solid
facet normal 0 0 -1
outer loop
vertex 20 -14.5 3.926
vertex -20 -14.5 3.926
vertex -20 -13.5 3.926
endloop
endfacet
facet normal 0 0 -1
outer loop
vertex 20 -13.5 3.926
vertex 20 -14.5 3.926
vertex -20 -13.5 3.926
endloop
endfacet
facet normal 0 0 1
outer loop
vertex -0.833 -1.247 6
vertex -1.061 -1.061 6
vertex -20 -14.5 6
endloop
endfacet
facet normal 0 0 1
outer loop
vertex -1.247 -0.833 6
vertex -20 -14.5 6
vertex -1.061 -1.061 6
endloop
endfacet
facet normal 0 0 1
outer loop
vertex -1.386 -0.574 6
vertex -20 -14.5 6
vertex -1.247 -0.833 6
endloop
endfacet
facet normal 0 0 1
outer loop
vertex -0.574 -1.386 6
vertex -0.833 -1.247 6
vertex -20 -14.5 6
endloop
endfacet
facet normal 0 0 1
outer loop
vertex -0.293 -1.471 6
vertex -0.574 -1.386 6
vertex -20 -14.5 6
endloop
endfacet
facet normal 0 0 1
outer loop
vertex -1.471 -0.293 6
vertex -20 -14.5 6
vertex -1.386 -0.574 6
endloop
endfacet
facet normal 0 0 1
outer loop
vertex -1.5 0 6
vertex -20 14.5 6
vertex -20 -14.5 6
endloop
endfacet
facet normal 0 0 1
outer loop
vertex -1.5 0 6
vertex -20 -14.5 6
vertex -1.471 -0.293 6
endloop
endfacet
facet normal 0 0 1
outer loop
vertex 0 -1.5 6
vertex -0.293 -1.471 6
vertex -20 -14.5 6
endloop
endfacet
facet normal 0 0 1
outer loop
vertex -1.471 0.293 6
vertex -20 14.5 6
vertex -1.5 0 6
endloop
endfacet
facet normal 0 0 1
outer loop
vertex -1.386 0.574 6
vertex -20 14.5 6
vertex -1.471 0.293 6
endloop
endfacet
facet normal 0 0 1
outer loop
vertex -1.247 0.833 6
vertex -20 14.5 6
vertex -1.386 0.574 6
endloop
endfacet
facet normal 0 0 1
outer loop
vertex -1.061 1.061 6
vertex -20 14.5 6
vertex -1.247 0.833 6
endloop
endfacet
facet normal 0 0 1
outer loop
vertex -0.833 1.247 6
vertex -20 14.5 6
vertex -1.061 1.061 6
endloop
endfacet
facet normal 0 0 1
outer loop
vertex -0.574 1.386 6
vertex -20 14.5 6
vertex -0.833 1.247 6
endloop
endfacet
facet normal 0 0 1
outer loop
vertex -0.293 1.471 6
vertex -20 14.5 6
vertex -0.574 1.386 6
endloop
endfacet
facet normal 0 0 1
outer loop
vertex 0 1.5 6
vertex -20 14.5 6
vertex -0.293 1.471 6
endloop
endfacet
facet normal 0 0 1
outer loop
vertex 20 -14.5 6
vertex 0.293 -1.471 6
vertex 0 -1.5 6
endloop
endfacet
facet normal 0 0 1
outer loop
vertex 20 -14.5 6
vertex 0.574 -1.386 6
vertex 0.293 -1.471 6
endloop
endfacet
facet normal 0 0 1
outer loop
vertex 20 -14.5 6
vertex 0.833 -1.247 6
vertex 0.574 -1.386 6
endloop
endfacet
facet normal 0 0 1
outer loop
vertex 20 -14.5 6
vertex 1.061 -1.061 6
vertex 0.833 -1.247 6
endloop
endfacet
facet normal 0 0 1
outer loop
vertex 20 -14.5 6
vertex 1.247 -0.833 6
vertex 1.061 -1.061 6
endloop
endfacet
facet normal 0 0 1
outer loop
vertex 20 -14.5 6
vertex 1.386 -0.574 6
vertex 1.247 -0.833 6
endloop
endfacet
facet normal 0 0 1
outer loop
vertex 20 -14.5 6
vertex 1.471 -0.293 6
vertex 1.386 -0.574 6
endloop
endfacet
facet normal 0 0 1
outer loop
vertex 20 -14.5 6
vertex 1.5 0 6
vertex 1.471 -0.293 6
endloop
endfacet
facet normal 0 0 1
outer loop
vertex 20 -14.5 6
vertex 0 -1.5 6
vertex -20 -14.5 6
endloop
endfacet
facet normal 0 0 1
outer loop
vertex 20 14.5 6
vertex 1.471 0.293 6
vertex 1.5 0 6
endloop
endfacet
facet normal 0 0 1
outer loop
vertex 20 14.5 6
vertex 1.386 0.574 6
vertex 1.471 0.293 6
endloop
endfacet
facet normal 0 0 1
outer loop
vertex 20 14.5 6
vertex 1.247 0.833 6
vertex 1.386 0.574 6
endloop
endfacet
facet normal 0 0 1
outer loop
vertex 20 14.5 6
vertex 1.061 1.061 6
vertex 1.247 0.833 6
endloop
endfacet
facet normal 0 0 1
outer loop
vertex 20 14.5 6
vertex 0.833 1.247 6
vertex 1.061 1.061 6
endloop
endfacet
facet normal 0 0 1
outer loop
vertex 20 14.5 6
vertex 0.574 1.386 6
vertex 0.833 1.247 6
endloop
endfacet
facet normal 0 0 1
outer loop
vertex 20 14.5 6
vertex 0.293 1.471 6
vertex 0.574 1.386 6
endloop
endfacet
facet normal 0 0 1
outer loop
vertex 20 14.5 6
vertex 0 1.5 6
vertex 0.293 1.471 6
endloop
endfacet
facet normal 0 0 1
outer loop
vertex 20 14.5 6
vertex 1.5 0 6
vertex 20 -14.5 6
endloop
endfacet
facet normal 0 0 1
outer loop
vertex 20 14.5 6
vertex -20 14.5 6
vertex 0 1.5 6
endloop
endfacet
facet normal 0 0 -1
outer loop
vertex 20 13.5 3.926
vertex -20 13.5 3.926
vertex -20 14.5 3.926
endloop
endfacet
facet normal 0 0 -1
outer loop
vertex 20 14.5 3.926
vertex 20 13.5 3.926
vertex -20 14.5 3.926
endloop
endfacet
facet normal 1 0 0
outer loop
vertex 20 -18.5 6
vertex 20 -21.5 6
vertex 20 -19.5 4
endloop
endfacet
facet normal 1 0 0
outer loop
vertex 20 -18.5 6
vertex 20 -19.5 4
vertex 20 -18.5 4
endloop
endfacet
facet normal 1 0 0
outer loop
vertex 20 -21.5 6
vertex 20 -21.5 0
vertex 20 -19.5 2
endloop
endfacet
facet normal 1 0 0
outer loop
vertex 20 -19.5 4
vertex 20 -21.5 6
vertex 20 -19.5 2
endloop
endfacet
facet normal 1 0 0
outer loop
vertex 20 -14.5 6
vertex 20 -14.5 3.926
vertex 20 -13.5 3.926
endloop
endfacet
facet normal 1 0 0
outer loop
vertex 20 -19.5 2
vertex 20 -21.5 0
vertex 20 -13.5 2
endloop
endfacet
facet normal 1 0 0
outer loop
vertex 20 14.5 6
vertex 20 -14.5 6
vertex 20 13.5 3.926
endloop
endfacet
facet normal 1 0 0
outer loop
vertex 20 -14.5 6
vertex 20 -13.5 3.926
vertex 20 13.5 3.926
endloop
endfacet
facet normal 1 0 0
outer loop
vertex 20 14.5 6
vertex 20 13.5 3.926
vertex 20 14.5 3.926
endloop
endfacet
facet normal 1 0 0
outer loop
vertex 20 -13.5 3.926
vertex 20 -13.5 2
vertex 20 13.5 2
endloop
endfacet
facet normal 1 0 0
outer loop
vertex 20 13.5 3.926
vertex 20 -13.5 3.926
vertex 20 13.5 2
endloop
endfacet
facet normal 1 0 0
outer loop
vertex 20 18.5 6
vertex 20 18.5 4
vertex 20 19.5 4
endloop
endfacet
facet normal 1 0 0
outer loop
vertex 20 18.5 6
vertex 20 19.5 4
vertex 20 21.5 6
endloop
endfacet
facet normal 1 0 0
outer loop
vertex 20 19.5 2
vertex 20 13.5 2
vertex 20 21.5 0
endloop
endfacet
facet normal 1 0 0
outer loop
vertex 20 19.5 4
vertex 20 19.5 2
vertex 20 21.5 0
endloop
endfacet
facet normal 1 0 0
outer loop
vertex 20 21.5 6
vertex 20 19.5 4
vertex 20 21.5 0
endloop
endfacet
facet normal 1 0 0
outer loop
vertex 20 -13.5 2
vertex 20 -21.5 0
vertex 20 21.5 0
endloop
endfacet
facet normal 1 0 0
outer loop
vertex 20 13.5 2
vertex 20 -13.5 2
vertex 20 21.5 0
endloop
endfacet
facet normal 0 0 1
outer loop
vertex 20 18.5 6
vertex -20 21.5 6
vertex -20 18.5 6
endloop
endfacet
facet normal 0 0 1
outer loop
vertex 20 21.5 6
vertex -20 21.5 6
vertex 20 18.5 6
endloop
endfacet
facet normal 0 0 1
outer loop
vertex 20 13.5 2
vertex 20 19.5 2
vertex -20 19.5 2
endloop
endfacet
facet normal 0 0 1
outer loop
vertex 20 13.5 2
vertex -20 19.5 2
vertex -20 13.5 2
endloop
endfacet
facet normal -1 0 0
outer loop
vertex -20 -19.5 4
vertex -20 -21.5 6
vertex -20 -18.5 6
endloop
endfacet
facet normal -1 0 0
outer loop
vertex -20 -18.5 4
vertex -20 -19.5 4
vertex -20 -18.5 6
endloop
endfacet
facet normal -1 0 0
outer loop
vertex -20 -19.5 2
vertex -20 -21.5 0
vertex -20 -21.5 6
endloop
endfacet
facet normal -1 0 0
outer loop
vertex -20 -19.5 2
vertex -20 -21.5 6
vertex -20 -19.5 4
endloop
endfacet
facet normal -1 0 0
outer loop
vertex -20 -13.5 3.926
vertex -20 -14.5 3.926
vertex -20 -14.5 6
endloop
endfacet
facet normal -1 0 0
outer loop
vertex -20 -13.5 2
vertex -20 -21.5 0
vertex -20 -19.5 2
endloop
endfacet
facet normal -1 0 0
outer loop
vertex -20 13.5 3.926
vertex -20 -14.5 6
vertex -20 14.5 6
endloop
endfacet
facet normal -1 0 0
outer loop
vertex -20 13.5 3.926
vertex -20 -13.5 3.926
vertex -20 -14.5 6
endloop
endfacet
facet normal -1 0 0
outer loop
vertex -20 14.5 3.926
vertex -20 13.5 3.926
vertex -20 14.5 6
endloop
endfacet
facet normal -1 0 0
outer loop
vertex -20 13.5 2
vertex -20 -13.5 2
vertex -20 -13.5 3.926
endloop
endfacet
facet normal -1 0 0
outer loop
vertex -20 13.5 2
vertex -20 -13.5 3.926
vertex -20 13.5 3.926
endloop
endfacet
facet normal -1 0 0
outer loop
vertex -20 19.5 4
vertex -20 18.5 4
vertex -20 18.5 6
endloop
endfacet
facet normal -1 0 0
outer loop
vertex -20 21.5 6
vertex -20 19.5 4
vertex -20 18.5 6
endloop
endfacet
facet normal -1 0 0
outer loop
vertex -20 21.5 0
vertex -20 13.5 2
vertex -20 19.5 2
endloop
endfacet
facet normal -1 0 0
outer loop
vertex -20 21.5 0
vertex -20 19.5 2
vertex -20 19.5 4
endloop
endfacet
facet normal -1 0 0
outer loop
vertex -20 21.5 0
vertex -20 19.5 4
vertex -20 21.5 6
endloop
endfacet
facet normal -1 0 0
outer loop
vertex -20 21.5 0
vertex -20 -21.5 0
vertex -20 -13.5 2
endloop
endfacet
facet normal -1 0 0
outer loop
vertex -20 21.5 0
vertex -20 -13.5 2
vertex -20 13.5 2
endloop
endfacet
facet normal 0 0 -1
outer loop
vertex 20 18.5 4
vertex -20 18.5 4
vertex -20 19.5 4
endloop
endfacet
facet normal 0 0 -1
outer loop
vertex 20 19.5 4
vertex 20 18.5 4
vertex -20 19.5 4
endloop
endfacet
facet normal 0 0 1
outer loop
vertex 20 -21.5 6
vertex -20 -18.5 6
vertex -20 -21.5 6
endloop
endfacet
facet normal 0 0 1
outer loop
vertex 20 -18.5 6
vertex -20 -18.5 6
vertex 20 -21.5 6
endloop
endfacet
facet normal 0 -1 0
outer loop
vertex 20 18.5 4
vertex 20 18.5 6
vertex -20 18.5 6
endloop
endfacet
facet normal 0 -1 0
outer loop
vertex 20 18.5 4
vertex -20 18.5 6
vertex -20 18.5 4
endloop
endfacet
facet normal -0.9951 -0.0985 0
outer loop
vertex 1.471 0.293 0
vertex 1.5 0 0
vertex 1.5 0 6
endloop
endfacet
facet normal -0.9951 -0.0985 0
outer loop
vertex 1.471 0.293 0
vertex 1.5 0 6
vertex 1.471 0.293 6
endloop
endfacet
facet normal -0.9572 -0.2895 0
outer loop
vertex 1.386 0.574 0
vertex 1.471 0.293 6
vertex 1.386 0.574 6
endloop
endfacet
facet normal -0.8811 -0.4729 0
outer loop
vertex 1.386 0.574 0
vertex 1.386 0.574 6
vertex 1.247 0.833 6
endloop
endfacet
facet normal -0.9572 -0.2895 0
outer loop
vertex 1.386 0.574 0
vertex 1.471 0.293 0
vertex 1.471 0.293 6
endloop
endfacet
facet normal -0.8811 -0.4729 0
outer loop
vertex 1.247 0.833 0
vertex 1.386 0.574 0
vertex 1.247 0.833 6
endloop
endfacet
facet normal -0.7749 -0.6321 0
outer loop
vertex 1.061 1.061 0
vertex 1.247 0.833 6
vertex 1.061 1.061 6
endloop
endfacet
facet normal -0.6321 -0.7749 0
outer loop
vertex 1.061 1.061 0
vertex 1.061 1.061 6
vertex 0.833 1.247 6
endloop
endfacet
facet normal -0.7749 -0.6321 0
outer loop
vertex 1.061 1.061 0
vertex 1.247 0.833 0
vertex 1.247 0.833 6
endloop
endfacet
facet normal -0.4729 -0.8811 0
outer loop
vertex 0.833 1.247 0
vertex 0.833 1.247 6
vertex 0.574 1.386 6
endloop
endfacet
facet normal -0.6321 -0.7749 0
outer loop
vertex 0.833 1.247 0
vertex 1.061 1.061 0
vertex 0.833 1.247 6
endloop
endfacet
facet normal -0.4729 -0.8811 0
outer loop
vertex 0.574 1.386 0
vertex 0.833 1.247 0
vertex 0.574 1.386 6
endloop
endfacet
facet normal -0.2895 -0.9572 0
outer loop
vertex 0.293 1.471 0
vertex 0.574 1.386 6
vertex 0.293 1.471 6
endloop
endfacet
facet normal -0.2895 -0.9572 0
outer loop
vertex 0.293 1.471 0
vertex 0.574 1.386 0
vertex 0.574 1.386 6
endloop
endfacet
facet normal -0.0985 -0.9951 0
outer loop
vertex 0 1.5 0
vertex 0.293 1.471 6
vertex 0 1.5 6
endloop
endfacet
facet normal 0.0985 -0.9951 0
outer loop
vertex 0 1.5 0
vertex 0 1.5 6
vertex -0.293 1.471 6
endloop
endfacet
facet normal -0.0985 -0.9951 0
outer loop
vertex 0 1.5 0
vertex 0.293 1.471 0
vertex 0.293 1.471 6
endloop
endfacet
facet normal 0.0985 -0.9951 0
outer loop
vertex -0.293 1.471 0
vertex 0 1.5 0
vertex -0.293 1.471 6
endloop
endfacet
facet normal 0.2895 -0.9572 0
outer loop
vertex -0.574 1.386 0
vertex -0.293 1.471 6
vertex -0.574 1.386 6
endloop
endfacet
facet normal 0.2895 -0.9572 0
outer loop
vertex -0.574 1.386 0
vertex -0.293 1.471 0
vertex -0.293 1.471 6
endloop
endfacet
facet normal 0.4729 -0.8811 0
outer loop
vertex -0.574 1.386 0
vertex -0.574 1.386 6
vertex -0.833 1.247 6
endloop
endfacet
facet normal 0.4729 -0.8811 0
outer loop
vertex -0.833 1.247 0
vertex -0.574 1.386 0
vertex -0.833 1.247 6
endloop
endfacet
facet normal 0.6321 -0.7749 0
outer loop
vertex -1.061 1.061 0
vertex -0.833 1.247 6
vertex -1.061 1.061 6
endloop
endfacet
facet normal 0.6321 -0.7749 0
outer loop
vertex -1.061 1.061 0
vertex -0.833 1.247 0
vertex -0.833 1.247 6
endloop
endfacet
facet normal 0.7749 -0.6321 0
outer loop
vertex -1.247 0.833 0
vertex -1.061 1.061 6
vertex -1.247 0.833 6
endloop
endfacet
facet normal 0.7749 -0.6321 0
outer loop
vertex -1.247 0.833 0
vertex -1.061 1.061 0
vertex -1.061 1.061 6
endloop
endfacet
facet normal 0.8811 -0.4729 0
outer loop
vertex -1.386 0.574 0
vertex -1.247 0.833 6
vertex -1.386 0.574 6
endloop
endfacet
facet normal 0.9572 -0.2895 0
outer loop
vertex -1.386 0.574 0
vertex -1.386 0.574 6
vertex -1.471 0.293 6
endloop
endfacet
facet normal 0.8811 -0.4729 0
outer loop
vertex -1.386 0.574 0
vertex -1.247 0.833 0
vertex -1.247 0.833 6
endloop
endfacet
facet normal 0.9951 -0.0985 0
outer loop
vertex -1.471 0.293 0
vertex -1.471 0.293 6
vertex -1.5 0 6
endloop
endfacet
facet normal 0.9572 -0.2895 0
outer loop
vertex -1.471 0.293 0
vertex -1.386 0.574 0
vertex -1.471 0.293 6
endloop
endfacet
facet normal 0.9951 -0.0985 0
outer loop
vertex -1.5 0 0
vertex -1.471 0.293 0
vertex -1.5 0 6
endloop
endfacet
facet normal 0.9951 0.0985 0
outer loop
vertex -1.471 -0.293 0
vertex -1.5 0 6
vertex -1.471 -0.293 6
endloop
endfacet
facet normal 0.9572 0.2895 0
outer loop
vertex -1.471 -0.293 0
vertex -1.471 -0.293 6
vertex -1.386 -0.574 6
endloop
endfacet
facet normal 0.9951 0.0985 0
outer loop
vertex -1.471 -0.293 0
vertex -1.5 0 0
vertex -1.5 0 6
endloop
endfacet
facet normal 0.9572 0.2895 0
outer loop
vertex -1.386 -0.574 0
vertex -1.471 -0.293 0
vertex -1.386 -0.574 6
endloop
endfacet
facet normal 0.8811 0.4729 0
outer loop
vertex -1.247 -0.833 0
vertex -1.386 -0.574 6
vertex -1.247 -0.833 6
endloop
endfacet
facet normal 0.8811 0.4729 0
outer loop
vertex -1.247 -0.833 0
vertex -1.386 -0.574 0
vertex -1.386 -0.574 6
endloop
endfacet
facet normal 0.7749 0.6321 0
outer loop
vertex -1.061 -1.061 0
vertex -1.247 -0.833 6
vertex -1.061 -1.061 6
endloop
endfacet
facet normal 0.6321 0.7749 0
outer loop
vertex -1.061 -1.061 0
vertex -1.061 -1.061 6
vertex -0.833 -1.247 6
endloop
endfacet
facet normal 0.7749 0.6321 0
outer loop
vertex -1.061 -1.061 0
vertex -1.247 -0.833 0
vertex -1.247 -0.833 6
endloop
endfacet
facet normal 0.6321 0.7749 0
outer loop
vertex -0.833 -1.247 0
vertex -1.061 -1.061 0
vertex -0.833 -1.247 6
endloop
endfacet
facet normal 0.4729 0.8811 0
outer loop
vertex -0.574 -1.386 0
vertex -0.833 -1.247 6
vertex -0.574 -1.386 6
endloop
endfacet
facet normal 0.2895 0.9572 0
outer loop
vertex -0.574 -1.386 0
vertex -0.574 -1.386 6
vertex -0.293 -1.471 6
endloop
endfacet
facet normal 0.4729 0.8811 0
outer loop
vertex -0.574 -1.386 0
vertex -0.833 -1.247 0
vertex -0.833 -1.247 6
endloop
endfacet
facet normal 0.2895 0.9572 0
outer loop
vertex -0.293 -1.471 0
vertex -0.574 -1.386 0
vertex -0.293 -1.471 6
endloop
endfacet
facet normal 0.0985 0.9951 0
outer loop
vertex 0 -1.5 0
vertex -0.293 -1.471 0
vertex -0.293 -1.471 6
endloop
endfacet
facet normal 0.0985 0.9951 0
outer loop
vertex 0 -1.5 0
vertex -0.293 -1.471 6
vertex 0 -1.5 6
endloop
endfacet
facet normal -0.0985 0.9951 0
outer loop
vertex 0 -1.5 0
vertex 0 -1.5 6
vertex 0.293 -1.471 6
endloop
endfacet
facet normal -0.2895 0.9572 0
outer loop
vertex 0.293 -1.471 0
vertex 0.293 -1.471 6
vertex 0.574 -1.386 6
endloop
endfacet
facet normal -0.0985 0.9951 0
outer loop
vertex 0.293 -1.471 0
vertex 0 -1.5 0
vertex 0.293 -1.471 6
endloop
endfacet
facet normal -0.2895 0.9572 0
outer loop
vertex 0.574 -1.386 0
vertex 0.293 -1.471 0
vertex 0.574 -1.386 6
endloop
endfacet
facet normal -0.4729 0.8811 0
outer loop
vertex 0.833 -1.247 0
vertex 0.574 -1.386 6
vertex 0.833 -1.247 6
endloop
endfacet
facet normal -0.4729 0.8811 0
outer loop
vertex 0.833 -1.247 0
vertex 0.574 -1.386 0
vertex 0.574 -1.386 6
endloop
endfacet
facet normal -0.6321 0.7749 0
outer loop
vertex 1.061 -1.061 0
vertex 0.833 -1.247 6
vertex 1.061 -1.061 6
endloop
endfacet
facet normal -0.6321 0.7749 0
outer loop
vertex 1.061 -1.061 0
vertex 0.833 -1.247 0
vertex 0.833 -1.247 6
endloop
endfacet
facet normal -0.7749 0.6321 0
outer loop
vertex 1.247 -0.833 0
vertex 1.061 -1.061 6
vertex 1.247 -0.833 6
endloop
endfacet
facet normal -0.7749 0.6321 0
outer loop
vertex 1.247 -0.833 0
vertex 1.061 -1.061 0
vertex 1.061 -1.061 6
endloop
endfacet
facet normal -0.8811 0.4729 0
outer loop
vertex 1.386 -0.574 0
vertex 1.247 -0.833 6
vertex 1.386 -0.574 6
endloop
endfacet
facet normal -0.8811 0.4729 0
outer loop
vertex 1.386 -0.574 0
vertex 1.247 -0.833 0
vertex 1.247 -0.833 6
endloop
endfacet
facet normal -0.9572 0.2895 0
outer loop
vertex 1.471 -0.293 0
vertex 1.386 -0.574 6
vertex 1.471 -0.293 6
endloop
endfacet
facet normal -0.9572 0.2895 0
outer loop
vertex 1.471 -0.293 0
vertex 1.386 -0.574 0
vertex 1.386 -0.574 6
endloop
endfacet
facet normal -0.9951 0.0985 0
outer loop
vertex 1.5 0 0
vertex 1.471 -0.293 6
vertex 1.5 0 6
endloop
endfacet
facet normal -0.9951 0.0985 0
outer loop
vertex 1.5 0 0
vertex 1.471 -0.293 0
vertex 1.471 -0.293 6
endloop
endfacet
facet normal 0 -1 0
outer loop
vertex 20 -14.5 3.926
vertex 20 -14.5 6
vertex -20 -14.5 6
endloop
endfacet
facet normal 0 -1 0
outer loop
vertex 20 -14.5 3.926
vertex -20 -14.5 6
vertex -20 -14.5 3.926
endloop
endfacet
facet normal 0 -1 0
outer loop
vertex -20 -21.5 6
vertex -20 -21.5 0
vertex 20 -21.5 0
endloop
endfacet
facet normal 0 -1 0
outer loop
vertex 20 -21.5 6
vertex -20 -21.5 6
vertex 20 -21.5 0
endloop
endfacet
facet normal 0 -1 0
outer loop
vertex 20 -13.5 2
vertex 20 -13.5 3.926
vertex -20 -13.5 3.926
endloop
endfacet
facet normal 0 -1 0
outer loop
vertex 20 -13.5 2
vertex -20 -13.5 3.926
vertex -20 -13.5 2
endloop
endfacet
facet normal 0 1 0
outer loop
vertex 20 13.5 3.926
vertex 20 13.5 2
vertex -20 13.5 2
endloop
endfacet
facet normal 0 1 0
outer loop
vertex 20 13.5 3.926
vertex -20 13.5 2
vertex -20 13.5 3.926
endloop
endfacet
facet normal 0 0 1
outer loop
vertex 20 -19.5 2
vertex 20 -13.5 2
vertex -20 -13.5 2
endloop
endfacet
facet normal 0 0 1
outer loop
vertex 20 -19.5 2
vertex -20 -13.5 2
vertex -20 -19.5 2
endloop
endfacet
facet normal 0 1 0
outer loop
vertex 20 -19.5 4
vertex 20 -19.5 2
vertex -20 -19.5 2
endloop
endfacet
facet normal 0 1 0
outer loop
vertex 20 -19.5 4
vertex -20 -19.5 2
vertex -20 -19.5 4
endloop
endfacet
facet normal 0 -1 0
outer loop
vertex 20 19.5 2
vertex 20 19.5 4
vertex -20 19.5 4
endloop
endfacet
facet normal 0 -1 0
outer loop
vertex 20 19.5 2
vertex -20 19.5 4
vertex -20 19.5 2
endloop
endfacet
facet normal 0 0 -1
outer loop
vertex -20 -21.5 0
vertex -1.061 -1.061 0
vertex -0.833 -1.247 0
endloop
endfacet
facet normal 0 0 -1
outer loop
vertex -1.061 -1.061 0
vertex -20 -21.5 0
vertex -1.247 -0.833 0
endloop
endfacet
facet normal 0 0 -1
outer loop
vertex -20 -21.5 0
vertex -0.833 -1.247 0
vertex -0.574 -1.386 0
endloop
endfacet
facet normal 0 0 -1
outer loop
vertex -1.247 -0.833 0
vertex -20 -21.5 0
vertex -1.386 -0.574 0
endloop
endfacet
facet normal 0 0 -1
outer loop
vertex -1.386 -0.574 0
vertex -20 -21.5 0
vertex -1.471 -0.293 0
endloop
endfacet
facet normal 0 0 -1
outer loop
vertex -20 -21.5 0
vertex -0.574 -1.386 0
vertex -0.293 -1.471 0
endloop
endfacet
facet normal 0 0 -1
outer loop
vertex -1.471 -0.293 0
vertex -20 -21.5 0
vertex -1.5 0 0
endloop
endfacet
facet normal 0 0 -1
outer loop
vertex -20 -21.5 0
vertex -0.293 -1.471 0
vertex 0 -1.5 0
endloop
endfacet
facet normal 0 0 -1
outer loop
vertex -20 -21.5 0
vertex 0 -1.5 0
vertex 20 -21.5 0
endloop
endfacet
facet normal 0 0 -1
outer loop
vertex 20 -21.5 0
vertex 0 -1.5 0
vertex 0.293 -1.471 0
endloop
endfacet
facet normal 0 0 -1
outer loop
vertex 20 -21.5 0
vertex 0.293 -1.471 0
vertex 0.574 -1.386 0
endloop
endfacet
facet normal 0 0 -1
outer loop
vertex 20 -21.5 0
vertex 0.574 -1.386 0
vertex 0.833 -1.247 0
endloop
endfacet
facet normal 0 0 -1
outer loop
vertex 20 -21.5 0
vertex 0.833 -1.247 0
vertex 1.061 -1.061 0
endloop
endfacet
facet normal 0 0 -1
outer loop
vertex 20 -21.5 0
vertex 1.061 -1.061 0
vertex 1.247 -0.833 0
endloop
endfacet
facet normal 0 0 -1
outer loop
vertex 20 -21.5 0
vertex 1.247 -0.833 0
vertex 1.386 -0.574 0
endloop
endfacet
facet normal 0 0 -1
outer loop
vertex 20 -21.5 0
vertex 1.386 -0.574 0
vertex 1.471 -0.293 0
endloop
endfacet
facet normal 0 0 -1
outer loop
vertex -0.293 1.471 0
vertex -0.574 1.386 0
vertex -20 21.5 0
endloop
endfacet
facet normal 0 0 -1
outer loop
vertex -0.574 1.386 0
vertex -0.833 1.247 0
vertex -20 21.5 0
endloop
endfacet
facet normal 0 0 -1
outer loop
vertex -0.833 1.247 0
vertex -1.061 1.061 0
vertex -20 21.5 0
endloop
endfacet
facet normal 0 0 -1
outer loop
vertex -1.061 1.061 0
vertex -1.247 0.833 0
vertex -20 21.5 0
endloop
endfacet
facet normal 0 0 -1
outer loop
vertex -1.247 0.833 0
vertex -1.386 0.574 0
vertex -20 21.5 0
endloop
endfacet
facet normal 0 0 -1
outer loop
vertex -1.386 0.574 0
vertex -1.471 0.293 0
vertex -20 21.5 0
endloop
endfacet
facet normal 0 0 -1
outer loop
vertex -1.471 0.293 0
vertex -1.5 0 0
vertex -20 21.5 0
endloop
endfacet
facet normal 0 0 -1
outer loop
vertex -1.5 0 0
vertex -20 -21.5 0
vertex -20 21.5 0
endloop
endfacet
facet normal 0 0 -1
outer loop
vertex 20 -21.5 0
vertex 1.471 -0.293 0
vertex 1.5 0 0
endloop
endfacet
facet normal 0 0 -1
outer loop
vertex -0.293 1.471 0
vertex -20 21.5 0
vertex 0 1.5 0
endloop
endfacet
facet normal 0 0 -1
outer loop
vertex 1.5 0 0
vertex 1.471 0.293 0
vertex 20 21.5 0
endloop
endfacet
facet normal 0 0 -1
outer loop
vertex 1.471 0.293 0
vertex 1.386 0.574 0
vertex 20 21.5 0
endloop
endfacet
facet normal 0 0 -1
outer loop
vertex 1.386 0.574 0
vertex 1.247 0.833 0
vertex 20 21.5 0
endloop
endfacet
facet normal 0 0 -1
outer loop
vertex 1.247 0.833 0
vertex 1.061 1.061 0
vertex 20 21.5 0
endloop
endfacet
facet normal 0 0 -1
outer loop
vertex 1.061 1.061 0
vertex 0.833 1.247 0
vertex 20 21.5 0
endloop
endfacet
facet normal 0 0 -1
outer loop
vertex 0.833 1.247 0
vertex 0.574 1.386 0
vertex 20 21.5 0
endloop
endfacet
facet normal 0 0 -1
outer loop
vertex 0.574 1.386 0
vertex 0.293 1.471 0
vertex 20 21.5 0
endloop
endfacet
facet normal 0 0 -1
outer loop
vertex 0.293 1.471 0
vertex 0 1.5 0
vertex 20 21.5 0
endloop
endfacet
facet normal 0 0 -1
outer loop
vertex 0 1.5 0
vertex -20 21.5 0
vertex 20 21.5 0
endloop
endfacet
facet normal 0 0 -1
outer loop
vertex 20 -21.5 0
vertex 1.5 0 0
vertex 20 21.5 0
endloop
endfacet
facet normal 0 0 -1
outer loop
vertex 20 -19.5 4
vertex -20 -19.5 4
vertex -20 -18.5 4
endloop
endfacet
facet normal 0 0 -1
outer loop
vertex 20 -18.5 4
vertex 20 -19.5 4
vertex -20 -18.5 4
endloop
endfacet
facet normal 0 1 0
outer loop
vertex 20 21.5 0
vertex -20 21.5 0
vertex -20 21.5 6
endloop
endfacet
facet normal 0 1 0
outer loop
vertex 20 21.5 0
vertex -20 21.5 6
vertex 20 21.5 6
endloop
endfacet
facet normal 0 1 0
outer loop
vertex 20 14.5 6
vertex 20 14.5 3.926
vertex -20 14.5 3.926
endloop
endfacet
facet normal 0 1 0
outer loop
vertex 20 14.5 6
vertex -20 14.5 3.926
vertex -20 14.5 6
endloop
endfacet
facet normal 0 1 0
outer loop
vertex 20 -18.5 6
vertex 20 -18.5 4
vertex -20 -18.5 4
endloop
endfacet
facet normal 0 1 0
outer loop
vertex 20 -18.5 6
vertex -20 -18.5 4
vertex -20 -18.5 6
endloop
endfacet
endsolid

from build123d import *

# Parameters (mm, degrees)
SKETCH_1_W          = 40
SKETCH_1_H          = 43
SKETCH_1_R          = 1.5
EXTRUDE_1_DEPTH     = 6
CUT_EXTRUDE_1_DEPTH = 46.806658905


with BuildPart() as part:
    # 草图1 → 凸台-拉伸1 (new body)
    with BuildSketch(Plane.XY):
        Rectangle(SKETCH_1_W, SKETCH_1_H)
        Circle(SKETCH_1_R, mode=Mode.SUBTRACT)
    extrude(amount=EXTRUDE_1_DEPTH)

    # 草图2 → 切除-拉伸1 (cut, through all)
    with BuildSketch(Plane(origin=(20, 0, 0), x_dir=(0, 0, -1), z_dir=(1, 0, 0))):
        Polygon((-6, 18.5), (-4, 18.5), (-4, 19.5), (-2, 19.5), (-2, 13.5), (-3.925973419, 13.5), (-3.925973419, 14.5), (-6, 14.5), align=None)
        Polygon((-6, -18.5), (-6, -14.5), (-3.925973419, -14.5), (-3.925973419, -13.5), (-2, -13.5), (-2, -19.5), (-4, -19.5), (-4, -18.5), align=None)
    extrude(amount=-CUT_EXTRUDE_1_DEPTH, mode=Mode.SUBTRACT)


solid = part.part
